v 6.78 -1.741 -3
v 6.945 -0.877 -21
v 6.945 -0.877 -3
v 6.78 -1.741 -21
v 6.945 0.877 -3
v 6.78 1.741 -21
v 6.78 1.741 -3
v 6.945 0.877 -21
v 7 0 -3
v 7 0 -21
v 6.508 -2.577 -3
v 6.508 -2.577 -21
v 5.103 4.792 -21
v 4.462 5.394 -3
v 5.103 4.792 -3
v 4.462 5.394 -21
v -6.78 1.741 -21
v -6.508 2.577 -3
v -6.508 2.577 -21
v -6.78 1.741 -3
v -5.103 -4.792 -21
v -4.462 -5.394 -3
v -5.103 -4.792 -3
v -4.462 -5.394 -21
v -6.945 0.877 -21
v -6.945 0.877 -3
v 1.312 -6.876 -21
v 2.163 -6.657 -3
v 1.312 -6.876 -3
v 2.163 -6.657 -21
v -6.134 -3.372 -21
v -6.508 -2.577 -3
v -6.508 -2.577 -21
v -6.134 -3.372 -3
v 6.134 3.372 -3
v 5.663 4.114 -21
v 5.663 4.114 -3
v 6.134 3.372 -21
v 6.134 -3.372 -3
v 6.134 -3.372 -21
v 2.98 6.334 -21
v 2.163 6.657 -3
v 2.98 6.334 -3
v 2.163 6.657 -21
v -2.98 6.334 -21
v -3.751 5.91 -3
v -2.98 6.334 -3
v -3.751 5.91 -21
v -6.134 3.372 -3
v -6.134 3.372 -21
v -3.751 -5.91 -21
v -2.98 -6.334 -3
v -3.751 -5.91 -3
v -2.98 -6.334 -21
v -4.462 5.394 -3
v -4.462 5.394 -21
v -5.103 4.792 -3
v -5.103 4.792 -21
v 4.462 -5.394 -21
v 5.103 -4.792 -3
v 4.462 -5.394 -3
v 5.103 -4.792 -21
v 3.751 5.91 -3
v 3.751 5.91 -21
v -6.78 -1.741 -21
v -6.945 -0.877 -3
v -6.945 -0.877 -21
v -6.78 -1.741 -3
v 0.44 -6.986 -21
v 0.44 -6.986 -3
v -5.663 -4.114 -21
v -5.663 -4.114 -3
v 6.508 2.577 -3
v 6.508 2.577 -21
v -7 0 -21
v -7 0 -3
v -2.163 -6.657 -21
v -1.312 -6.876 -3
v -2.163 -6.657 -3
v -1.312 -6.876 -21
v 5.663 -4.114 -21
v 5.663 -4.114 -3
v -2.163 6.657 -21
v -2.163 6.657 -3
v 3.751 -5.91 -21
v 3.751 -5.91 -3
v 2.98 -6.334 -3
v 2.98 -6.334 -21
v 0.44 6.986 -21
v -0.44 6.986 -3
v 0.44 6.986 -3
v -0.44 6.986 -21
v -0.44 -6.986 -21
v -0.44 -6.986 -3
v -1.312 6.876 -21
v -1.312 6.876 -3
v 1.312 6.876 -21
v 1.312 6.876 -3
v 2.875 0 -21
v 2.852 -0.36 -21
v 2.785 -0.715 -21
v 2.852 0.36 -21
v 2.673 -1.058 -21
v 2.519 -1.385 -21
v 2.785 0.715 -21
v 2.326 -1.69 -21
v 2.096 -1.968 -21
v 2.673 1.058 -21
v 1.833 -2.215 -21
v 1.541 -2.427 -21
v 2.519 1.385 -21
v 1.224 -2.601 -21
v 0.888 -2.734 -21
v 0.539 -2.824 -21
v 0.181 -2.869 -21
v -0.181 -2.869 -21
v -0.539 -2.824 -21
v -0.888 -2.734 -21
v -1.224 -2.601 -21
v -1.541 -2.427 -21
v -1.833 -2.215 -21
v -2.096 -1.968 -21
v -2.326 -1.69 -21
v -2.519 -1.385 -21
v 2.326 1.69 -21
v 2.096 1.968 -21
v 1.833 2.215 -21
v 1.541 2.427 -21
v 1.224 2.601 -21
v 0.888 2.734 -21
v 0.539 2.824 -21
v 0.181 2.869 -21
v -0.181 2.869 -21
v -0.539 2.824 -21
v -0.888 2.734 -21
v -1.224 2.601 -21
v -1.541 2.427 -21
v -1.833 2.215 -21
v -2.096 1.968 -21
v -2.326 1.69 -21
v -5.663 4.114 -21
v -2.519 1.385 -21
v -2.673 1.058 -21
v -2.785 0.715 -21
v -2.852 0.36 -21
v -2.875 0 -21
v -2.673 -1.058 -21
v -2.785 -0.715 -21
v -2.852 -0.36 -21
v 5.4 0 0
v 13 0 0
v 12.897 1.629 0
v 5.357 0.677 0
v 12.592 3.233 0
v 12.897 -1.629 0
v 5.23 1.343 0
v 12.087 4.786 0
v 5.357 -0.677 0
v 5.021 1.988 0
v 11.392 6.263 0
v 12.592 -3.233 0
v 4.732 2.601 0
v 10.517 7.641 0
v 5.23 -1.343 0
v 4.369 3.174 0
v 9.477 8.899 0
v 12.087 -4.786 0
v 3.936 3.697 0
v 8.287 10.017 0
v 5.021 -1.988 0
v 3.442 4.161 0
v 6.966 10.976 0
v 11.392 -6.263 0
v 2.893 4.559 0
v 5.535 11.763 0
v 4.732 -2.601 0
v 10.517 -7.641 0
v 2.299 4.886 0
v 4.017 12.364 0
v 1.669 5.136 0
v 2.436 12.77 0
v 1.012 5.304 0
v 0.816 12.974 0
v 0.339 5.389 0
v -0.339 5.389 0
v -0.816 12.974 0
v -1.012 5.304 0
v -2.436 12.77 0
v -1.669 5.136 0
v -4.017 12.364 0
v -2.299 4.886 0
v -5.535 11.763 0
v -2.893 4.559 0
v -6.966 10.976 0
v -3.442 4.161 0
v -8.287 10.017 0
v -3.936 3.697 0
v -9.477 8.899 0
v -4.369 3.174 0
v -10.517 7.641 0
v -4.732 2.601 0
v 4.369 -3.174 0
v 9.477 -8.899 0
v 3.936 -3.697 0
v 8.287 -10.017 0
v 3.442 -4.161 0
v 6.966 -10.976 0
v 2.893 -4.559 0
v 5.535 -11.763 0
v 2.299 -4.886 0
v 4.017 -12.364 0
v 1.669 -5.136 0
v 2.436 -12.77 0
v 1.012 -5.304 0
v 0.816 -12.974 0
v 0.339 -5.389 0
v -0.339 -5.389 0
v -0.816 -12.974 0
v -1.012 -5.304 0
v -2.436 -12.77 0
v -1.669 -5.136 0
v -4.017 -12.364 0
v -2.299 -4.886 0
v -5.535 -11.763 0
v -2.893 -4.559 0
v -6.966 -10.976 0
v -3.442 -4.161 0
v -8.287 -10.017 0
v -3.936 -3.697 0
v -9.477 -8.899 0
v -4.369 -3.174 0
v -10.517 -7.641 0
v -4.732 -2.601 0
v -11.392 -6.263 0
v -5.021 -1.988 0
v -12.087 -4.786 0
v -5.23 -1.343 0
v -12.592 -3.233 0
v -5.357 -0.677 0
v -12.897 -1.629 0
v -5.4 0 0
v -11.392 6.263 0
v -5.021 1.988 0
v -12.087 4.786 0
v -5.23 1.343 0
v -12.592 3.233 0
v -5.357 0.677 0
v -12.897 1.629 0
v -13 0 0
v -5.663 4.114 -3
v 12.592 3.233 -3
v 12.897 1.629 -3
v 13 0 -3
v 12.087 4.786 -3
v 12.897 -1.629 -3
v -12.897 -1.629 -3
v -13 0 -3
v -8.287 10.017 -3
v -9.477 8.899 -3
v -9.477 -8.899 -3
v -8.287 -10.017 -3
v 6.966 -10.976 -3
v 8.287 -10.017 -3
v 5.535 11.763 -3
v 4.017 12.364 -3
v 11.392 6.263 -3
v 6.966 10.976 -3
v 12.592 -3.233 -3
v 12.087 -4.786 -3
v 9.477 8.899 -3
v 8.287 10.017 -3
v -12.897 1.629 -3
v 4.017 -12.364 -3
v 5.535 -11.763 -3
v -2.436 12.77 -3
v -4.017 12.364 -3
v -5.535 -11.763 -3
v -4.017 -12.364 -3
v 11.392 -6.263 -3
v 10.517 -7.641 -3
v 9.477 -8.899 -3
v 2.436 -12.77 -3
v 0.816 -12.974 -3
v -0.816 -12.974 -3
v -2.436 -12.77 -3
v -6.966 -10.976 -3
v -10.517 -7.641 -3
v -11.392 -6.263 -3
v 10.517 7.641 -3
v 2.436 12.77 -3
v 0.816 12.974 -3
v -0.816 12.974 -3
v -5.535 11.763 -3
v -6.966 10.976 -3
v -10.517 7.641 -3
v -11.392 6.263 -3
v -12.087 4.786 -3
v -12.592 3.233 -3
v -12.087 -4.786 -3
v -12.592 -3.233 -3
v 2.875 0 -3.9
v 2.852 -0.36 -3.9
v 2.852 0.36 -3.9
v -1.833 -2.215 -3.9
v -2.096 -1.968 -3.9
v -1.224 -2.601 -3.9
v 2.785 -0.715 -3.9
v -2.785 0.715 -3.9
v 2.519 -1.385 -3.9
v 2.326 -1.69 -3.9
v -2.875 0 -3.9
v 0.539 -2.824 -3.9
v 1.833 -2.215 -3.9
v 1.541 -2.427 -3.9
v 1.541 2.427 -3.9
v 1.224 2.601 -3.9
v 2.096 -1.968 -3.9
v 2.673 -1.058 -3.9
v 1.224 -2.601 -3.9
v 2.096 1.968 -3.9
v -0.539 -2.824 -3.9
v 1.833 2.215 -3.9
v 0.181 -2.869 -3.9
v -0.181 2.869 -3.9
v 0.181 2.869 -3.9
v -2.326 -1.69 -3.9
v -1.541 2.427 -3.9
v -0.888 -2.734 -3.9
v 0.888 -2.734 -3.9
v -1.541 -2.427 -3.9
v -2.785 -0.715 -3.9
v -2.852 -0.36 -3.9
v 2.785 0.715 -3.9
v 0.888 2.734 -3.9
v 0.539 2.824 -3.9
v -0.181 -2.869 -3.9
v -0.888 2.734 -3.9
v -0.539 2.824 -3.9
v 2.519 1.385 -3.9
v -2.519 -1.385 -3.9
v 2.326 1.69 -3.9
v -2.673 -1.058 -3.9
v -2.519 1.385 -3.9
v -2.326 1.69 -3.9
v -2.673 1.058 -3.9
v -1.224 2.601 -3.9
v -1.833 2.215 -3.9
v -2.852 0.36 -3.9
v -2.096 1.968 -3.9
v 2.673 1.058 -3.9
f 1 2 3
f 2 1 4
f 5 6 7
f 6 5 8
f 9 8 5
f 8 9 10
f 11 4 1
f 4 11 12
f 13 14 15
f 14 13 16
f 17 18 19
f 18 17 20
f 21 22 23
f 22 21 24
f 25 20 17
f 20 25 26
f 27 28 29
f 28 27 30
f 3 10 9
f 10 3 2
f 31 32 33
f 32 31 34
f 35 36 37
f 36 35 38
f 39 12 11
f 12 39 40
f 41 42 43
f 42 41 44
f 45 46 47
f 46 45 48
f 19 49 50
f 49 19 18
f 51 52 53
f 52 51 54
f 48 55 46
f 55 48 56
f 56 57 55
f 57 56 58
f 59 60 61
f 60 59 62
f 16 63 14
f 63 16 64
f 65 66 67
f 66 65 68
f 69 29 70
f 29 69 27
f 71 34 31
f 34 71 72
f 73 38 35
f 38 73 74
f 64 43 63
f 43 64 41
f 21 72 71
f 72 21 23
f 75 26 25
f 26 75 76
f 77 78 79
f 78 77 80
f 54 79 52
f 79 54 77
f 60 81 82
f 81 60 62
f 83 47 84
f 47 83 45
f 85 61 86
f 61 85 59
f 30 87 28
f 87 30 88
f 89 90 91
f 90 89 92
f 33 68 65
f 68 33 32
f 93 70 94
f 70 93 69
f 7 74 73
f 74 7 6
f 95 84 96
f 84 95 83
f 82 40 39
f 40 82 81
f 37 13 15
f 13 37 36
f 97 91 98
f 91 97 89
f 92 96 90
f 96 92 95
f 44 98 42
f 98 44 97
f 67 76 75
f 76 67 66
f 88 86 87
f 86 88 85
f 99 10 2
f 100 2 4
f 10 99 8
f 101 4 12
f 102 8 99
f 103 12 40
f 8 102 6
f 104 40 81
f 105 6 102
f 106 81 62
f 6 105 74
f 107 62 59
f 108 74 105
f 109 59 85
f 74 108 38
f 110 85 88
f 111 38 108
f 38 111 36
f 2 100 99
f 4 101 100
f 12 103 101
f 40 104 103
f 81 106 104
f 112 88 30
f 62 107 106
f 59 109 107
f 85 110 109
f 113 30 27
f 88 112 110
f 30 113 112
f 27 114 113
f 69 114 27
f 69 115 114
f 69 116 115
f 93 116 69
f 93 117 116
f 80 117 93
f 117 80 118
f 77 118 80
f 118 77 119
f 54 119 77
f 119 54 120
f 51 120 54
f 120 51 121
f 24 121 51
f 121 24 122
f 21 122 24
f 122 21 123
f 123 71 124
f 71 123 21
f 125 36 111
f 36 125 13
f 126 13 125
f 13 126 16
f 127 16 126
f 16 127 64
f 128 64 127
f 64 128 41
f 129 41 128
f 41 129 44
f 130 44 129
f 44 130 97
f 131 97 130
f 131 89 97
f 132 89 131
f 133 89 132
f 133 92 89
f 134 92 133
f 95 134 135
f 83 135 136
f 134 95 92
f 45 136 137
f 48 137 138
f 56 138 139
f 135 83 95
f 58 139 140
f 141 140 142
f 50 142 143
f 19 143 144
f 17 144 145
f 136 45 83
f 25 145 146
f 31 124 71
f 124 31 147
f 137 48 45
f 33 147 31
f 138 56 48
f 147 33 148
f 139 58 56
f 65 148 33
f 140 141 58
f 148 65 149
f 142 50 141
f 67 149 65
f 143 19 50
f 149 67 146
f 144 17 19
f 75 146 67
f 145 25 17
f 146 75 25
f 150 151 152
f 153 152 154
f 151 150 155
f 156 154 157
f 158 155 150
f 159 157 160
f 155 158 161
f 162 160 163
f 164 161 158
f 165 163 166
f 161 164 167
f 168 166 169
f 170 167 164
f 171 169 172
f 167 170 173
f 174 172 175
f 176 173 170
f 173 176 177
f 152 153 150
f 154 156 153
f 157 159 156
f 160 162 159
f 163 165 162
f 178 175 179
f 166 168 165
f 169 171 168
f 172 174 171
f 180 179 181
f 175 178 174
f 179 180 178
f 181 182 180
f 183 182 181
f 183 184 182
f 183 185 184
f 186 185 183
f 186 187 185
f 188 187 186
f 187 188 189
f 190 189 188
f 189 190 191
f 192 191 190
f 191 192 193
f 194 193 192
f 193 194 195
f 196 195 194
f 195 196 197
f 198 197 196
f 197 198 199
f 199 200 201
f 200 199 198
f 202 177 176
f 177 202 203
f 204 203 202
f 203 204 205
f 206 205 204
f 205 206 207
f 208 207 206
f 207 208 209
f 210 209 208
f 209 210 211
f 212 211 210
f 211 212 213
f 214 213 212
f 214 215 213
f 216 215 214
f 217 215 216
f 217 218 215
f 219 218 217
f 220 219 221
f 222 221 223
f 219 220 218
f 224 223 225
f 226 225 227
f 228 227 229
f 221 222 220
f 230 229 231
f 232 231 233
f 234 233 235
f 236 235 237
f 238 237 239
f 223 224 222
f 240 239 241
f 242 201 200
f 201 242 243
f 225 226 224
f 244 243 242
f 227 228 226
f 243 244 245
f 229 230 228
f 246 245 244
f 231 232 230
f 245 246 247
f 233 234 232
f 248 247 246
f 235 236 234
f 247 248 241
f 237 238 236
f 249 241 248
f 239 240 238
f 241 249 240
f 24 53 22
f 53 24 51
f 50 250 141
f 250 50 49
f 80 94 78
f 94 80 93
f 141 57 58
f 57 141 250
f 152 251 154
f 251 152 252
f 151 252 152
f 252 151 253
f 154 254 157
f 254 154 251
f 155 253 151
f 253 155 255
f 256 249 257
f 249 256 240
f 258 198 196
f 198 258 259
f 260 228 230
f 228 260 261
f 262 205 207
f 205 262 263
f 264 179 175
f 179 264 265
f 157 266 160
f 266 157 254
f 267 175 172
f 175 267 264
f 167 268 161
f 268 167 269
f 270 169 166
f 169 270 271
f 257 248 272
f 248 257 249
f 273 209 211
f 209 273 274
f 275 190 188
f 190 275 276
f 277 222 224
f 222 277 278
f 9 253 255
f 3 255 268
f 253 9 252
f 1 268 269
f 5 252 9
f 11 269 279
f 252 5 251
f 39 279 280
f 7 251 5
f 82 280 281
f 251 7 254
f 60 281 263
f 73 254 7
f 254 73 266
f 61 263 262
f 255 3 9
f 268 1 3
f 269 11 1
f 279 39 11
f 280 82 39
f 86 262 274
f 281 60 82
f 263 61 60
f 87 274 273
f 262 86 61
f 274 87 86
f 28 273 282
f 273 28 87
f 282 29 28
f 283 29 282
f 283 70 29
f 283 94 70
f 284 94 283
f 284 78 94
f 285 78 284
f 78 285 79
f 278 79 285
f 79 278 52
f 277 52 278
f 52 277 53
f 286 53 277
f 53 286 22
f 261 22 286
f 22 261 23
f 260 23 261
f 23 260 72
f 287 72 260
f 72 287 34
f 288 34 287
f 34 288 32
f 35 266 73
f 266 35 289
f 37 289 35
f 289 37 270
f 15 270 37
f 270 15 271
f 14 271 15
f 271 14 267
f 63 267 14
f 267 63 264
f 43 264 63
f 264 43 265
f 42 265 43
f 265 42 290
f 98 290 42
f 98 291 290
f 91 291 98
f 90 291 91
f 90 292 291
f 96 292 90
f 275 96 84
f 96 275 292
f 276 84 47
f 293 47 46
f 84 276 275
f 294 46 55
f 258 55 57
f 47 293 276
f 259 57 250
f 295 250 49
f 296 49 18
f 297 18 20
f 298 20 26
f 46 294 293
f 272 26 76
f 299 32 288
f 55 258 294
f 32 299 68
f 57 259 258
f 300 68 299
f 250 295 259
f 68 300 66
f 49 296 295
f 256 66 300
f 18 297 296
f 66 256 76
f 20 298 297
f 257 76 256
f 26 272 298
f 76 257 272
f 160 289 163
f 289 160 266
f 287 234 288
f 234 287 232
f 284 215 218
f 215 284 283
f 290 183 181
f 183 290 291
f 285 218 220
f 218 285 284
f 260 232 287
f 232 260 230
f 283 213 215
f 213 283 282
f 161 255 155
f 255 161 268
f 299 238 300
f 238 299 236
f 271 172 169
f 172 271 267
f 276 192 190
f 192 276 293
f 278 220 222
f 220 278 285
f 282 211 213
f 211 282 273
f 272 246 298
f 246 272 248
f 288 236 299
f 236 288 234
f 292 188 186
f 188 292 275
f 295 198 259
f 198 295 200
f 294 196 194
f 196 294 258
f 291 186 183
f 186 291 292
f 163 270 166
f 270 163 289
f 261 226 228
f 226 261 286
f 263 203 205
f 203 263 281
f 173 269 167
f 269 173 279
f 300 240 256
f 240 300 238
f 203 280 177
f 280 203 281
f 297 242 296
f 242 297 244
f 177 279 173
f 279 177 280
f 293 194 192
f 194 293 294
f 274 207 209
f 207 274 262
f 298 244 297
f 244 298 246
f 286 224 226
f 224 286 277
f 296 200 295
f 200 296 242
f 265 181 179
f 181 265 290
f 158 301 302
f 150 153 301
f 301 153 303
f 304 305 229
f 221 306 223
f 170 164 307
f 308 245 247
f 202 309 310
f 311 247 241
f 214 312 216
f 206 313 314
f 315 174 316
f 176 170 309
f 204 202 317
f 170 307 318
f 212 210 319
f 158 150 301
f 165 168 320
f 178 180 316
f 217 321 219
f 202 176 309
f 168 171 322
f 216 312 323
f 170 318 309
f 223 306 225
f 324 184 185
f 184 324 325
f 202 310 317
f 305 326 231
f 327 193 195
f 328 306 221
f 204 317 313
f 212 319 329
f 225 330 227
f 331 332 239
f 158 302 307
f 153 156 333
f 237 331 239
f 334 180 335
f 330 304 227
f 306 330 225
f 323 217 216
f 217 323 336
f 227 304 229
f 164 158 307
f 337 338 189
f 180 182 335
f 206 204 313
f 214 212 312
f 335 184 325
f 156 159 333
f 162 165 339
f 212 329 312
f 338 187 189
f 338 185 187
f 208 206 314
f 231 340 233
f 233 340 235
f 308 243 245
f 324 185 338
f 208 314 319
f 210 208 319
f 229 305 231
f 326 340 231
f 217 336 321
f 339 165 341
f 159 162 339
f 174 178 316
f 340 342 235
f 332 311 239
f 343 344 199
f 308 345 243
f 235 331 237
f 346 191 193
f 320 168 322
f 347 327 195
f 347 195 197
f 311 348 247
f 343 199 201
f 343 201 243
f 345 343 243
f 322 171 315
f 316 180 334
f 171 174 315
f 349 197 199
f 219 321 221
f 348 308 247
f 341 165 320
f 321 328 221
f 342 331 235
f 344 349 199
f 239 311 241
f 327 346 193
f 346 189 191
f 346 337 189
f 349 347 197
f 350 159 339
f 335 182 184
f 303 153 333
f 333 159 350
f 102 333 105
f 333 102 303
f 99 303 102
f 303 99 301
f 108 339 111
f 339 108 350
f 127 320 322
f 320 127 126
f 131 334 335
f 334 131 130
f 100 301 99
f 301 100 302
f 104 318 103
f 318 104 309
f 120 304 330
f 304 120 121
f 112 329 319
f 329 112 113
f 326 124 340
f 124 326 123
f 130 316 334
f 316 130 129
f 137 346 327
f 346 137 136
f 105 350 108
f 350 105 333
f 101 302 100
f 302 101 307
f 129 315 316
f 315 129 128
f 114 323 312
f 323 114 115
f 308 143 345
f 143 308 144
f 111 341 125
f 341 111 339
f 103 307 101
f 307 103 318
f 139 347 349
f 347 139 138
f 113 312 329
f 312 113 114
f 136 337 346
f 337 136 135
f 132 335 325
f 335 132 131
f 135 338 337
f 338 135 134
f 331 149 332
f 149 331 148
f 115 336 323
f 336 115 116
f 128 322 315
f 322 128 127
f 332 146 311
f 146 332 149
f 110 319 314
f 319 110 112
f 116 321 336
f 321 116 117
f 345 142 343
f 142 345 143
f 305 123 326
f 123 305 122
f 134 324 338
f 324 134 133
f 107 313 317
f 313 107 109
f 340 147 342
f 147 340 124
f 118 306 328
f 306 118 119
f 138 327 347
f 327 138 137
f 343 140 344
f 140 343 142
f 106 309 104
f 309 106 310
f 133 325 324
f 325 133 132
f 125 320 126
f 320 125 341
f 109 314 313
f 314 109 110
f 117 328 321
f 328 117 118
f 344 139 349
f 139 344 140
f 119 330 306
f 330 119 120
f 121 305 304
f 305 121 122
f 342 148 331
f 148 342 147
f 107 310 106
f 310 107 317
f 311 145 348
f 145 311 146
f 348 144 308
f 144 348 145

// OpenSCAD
$fn = 50;


difference() {
	union() {
		translate(v = [0, 0, -21.0000000000]) {
			cylinder(h = 21, r = 7.0000000000);
		}
		translate(v = [0, 0, -3.0000000000]) {
			cylinder(h = 3, r = 13.0000000000);
		}
	}
	union() {
		translate(v = [0, 0, 0]) {
			rotate(a = [0, 0, 0]) {
				difference() {
					union() {
						#translate(v = [0, 0, -21.0000000000]) {
							cylinder(h = 21, r = 2.6000000000);
						}
						#translate(v = [0, 0, -3.9000000000]) {
							cylinder(h = 3.9000000000, r1 = 2.8750000000, r2 = 5.4000000000);
						}
						#translate(v = [0, 0, -21.0000000000]) {
							cylinder(h = 21, r = 2.8750000000);
						}
						#translate(v = [0, 0, -21.0000000000]) {
							cylinder(h = 21, r = 2.6000000000);
						}
					}
					union();
				}
			}
		}
	}
}
